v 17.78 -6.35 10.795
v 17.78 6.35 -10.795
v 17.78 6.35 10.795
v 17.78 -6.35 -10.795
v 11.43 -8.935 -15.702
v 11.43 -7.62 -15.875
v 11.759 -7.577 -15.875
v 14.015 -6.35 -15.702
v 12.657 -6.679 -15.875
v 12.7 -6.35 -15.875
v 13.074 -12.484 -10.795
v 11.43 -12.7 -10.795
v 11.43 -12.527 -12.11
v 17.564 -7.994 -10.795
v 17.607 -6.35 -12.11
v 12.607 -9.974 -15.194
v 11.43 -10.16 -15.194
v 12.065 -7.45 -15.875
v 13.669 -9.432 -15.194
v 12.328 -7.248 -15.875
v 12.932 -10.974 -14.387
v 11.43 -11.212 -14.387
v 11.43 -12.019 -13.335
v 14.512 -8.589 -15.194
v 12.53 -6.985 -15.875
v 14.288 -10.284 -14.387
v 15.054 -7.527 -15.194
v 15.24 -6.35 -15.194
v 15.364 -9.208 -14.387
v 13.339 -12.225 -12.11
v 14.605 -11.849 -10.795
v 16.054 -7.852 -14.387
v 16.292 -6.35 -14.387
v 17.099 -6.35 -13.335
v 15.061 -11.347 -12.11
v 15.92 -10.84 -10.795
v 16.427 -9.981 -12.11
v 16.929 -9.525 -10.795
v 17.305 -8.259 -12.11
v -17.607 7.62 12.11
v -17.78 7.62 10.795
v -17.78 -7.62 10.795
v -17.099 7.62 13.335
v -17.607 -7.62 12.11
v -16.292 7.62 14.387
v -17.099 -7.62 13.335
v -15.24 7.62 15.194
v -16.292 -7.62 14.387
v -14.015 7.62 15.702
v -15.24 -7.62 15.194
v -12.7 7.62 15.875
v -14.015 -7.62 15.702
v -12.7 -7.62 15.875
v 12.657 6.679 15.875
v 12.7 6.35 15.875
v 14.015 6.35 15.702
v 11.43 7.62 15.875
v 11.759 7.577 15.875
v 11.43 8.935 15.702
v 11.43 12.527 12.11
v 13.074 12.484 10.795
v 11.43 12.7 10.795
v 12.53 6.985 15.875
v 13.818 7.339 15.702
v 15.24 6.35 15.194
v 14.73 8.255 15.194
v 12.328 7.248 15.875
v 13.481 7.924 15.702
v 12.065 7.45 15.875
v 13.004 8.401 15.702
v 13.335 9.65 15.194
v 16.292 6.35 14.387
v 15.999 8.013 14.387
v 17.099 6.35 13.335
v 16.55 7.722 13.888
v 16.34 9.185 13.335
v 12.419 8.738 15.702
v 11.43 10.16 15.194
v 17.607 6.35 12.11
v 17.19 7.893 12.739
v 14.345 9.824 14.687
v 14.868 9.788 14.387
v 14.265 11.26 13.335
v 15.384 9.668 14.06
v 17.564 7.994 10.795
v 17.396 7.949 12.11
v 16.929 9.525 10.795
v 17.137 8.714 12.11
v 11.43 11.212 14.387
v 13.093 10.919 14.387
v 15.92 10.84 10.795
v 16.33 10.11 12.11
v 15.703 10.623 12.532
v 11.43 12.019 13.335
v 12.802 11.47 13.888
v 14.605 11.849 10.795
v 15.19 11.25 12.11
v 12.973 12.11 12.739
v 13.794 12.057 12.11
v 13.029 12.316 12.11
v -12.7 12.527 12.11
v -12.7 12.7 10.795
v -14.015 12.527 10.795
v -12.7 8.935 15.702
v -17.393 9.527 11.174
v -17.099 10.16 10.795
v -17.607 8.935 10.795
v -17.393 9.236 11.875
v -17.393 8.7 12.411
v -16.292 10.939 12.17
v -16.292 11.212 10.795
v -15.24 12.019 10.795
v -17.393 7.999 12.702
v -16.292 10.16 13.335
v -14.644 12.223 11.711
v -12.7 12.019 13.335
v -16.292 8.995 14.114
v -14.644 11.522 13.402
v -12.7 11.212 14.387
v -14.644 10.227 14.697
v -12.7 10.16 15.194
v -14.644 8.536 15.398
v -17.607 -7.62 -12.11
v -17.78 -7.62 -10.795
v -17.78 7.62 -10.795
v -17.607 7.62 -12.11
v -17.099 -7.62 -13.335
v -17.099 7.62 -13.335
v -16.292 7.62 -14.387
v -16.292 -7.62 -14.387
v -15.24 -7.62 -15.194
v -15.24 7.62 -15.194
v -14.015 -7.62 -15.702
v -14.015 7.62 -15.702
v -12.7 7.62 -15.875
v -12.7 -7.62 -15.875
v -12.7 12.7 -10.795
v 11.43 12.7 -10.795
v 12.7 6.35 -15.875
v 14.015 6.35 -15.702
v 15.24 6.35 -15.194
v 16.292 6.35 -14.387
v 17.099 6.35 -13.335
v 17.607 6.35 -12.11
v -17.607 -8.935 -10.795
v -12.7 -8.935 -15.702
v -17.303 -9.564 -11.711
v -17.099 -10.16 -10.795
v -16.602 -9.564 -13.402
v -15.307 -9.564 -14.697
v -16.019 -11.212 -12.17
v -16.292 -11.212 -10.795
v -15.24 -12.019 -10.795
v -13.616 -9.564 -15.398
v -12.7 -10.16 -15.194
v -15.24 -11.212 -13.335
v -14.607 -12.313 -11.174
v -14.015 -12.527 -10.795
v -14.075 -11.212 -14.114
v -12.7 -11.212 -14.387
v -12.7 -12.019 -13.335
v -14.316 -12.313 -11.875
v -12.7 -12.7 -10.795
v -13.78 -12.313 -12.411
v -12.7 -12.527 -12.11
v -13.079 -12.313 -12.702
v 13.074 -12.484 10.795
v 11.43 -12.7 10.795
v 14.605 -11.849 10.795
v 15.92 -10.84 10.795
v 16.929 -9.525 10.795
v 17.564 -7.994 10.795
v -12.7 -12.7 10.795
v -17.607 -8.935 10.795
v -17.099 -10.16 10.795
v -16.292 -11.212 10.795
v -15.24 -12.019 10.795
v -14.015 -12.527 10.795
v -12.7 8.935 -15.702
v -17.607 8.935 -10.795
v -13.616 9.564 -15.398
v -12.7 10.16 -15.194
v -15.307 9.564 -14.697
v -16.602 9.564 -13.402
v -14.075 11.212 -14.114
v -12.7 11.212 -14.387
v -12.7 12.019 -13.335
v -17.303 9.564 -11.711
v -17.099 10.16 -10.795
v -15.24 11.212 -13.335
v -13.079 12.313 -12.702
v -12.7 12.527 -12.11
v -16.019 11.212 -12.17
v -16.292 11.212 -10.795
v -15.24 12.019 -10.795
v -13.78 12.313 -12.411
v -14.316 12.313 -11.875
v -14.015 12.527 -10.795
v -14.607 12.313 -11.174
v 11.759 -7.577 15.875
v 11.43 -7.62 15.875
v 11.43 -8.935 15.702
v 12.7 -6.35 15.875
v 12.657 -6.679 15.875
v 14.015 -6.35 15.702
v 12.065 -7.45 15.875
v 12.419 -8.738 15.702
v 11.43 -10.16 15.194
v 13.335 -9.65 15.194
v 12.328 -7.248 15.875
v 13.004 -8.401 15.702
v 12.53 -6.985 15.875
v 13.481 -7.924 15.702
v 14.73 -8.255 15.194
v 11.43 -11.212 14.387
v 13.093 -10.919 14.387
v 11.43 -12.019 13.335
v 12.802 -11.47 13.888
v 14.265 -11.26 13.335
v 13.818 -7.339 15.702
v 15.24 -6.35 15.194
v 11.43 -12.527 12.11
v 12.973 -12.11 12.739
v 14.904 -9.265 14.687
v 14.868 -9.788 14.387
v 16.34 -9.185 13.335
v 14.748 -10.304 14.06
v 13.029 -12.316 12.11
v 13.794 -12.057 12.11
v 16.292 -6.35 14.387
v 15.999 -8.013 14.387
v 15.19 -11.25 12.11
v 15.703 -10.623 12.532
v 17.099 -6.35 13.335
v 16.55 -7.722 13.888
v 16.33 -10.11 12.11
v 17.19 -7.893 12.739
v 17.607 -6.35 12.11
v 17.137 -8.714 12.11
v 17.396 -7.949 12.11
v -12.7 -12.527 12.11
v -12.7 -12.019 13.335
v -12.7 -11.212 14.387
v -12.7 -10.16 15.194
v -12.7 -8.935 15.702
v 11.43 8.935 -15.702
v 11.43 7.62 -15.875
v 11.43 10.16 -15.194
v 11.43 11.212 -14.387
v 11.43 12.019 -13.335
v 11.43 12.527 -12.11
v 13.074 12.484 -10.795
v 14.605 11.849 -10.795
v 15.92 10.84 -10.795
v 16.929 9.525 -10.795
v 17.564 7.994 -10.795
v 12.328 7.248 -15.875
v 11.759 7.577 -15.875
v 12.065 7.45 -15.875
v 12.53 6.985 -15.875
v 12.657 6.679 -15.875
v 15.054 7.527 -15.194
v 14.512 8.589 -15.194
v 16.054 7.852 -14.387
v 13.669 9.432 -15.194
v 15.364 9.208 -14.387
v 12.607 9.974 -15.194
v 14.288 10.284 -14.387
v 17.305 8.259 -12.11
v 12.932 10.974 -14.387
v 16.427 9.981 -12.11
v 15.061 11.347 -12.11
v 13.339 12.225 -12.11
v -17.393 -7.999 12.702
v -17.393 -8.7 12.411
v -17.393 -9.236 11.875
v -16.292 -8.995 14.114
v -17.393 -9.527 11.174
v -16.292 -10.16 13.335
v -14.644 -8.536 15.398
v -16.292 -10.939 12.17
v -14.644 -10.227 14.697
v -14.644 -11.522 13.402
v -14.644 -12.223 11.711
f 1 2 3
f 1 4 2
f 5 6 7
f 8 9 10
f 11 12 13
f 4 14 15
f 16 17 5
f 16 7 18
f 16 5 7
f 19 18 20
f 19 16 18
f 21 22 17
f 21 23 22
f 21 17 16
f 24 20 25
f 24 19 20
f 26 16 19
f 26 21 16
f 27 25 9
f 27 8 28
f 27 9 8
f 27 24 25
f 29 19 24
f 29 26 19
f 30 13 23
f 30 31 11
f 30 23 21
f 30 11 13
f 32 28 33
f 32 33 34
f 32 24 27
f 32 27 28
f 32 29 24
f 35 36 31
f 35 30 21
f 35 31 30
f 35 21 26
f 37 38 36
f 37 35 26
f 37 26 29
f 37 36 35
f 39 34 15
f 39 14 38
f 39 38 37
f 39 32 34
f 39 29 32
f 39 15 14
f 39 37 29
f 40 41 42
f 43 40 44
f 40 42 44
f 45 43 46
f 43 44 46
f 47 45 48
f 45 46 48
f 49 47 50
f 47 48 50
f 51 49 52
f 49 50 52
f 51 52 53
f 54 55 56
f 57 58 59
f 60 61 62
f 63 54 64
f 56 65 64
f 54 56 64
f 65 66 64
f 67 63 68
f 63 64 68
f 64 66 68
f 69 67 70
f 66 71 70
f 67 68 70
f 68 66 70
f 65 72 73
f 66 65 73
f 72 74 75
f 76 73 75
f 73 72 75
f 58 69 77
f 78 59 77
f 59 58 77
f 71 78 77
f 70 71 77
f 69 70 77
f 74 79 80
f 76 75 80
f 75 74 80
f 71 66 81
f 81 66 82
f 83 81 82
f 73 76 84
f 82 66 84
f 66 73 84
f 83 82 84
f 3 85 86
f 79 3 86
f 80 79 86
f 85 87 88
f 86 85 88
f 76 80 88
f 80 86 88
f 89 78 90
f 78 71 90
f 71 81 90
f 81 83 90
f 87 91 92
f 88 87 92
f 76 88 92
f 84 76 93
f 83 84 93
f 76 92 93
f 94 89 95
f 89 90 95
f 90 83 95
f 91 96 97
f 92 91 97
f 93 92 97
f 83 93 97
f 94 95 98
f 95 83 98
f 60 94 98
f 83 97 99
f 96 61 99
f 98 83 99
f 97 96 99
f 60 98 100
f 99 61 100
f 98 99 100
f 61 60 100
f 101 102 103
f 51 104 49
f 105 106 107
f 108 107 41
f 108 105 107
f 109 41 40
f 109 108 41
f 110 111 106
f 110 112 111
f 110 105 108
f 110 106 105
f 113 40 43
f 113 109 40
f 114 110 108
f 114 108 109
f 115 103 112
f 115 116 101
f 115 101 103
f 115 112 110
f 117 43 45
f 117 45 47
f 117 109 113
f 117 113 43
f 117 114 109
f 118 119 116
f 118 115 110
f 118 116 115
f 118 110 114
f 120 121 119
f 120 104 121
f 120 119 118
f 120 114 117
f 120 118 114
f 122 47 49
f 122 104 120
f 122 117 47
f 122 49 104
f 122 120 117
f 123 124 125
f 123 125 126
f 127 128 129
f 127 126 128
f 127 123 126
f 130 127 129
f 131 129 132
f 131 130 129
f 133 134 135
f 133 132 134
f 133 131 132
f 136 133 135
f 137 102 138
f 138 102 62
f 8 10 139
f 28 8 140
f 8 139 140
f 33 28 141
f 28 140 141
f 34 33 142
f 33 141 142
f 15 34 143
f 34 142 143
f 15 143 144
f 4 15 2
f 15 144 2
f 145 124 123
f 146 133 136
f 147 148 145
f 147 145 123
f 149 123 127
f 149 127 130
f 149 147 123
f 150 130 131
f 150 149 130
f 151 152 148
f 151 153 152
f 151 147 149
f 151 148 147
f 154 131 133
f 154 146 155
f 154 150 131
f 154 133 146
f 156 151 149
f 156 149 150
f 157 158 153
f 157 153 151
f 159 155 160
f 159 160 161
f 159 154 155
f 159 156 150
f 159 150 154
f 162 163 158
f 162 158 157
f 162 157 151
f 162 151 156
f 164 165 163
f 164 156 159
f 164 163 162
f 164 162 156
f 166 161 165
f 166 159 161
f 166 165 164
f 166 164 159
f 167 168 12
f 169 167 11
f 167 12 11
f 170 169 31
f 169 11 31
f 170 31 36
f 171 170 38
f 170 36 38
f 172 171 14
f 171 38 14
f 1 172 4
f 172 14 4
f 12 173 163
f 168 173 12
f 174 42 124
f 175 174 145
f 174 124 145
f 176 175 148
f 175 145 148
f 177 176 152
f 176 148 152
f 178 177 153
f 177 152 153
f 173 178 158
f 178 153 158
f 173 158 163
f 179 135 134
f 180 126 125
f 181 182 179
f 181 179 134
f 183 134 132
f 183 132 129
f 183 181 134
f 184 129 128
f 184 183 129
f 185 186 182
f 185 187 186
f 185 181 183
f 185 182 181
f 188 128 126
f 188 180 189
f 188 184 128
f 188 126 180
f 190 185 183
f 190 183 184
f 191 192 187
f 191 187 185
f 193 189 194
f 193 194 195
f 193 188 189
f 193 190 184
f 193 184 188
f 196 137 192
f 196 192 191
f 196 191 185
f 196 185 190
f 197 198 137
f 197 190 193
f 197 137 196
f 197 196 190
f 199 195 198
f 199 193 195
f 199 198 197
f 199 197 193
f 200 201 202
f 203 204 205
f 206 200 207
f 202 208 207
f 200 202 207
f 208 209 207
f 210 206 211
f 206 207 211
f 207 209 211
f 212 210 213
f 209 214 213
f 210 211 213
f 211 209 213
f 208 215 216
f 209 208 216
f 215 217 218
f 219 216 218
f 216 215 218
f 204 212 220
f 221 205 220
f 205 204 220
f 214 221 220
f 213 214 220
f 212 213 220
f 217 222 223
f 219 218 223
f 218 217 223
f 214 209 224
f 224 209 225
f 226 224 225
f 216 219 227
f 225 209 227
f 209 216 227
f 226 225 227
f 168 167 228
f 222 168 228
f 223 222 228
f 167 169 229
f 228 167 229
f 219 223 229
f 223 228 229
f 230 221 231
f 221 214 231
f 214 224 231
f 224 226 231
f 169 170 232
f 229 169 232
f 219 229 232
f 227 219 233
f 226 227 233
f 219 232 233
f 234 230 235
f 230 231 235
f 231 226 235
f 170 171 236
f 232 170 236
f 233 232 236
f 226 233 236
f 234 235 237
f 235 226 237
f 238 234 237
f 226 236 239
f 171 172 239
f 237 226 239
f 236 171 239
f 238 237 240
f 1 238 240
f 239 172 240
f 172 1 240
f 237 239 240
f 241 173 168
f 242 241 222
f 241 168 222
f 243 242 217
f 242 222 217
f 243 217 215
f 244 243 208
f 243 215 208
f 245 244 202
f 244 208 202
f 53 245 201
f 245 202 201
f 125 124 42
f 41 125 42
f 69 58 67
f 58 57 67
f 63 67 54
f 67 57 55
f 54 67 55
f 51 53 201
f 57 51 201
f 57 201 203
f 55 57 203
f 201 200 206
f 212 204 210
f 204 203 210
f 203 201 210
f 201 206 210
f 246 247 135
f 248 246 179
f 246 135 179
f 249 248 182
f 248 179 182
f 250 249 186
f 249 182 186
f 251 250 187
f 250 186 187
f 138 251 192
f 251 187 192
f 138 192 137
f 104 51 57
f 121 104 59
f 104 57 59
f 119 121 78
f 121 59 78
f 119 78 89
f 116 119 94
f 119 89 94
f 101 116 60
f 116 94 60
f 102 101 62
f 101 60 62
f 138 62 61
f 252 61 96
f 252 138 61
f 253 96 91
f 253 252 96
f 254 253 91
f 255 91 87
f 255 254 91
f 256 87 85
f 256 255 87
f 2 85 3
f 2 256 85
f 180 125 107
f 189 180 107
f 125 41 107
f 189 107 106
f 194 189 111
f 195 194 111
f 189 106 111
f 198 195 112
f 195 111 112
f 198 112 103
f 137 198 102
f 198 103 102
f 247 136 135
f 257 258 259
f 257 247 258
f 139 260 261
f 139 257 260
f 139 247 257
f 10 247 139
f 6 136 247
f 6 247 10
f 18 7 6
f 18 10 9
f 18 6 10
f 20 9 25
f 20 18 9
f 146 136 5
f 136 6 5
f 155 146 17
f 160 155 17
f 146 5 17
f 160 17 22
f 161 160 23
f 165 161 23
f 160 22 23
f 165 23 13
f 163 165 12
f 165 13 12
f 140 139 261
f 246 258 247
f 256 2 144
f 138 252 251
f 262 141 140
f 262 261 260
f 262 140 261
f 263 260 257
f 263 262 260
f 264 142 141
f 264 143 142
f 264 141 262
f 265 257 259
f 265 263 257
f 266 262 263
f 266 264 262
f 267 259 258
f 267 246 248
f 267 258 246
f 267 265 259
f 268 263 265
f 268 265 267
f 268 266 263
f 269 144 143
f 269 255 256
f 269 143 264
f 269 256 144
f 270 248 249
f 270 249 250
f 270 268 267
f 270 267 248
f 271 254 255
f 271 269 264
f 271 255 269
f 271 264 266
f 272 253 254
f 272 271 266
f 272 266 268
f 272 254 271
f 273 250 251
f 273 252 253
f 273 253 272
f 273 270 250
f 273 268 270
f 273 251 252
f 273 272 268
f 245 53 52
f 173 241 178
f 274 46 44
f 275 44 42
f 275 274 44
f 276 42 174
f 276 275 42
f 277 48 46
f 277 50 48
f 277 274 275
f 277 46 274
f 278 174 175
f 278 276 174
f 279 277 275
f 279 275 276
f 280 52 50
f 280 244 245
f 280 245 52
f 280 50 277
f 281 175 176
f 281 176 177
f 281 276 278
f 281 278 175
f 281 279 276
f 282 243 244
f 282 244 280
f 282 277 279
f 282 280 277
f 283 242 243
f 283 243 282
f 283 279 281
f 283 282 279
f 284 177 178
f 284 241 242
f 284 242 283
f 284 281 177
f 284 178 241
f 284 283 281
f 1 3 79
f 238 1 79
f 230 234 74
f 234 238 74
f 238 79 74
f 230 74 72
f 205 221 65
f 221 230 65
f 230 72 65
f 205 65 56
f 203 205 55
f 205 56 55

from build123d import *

# Parameters (mm, degrees)
F0_W        = 35.56
F0_H        = 31.75
F1_DEPTH    = 12.7
F2_R        = 5.08
F3_T1_DEPTH = 47.625
F3_T4_ANGLE = 90
F3_T6_ANGLE = 90
F4_R        = 5.08
F5_R        = 5.08


# Not quite as in the source:
# - a fillet or chamfer that OpenCascade refuses, or shapes differently, is made with other operations: its cross-section is extruded or revolved along the edge and cut away or added


with BuildPart() as f1:
    # F0 (on Front) → F1 (new body, symmetric)
    with BuildSketch(Plane.XZ):
        Rectangle(F0_W, F0_H)
    extrude(amount=F1_DEPTH, both=True)

    # F2
    f2_edges = [f1.edges().sort_by_distance(p)[0] for p in [
        (0, -12.7, 15.875),
        (0, 12.7, 15.875),
        (17.78, 0, 15.875),
    ]]
    fillet(f2_edges, radius=F2_R)

    # F3: fillet of radius 6.35 on 2 edges, made by hand

    # F3_s2 → F3_t1 (cut)
    with BuildSketch(Plane.XY.offset(-31.75)):
        with BuildLine():
            ThreePointArc((11.43, -12.7), (15.9201280605, -10.8401280605), (17.78, -6.35))
            Line((17.78, -6.35), (17.78, -12.7))
            Line((17.78, -12.7), (11.43, -12.7))
        make_face()
        with BuildLine():
            ThreePointArc((11.43, 12.7), (15.9201280605, 10.8401280605), (17.78, 6.35))
            Line((17.78, 6.35), (17.78, 12.7))
            Line((17.78, 12.7), (11.43, 12.7))
        make_face()
    extrude(amount=F3_T1_DEPTH, mode=Mode.SUBTRACT)

    # F3_s3 → F3_t4 (revolve, cut)
    with BuildSketch(Plane.XZ.offset(-6.35)):
        with BuildLine():
            ThreePointArc((12.7, 15.875), (16.2921024484, 14.3871024484), (17.78, 10.795))
            Line((17.78, 10.795), (17.78, 15.875))
            Line((17.78, 15.875), (12.7, 15.875))
        make_face()
    revolve(axis=Axis((11.43, 6.35, 15.875), (0, 0, 1)), revolution_arc=F3_T4_ANGLE, mode=Mode.SUBTRACT)

    # F3_s5 → F3_t6 (revolve, cut)
    with BuildSketch(Plane.YZ.offset(11.43)):
        with BuildLine():
            ThreePointArc((-7.62, 15.875), (-11.2121024484, 14.3871024484), (-12.7, 10.795))
            Line((-12.7, 10.795), (-12.7, 15.875))
            Line((-12.7, 15.875), (-7.62, 15.875))
        make_face()
    revolve(axis=Axis((11.43, -6.35, 15.875), (0, 0, 1)), revolution_arc=F3_T6_ANGLE, mode=Mode.SUBTRACT)

    # F4
    f4_edges = [f1.edges().sort_by_distance(p)[0] for p in [
        (-17.78, 0, -15.875),
    ]]
    fillet(f4_edges, radius=F4_R)

    # F5
    f5_edges = [f1.edges().sort_by_distance(p)[0] for p in [
        (-16.292102, -12.7, -14.387102),
        (-16.292102, 12.7, -14.387102),
    ]]
    fillet(f5_edges, radius=F5_R)


solid = f1.part
